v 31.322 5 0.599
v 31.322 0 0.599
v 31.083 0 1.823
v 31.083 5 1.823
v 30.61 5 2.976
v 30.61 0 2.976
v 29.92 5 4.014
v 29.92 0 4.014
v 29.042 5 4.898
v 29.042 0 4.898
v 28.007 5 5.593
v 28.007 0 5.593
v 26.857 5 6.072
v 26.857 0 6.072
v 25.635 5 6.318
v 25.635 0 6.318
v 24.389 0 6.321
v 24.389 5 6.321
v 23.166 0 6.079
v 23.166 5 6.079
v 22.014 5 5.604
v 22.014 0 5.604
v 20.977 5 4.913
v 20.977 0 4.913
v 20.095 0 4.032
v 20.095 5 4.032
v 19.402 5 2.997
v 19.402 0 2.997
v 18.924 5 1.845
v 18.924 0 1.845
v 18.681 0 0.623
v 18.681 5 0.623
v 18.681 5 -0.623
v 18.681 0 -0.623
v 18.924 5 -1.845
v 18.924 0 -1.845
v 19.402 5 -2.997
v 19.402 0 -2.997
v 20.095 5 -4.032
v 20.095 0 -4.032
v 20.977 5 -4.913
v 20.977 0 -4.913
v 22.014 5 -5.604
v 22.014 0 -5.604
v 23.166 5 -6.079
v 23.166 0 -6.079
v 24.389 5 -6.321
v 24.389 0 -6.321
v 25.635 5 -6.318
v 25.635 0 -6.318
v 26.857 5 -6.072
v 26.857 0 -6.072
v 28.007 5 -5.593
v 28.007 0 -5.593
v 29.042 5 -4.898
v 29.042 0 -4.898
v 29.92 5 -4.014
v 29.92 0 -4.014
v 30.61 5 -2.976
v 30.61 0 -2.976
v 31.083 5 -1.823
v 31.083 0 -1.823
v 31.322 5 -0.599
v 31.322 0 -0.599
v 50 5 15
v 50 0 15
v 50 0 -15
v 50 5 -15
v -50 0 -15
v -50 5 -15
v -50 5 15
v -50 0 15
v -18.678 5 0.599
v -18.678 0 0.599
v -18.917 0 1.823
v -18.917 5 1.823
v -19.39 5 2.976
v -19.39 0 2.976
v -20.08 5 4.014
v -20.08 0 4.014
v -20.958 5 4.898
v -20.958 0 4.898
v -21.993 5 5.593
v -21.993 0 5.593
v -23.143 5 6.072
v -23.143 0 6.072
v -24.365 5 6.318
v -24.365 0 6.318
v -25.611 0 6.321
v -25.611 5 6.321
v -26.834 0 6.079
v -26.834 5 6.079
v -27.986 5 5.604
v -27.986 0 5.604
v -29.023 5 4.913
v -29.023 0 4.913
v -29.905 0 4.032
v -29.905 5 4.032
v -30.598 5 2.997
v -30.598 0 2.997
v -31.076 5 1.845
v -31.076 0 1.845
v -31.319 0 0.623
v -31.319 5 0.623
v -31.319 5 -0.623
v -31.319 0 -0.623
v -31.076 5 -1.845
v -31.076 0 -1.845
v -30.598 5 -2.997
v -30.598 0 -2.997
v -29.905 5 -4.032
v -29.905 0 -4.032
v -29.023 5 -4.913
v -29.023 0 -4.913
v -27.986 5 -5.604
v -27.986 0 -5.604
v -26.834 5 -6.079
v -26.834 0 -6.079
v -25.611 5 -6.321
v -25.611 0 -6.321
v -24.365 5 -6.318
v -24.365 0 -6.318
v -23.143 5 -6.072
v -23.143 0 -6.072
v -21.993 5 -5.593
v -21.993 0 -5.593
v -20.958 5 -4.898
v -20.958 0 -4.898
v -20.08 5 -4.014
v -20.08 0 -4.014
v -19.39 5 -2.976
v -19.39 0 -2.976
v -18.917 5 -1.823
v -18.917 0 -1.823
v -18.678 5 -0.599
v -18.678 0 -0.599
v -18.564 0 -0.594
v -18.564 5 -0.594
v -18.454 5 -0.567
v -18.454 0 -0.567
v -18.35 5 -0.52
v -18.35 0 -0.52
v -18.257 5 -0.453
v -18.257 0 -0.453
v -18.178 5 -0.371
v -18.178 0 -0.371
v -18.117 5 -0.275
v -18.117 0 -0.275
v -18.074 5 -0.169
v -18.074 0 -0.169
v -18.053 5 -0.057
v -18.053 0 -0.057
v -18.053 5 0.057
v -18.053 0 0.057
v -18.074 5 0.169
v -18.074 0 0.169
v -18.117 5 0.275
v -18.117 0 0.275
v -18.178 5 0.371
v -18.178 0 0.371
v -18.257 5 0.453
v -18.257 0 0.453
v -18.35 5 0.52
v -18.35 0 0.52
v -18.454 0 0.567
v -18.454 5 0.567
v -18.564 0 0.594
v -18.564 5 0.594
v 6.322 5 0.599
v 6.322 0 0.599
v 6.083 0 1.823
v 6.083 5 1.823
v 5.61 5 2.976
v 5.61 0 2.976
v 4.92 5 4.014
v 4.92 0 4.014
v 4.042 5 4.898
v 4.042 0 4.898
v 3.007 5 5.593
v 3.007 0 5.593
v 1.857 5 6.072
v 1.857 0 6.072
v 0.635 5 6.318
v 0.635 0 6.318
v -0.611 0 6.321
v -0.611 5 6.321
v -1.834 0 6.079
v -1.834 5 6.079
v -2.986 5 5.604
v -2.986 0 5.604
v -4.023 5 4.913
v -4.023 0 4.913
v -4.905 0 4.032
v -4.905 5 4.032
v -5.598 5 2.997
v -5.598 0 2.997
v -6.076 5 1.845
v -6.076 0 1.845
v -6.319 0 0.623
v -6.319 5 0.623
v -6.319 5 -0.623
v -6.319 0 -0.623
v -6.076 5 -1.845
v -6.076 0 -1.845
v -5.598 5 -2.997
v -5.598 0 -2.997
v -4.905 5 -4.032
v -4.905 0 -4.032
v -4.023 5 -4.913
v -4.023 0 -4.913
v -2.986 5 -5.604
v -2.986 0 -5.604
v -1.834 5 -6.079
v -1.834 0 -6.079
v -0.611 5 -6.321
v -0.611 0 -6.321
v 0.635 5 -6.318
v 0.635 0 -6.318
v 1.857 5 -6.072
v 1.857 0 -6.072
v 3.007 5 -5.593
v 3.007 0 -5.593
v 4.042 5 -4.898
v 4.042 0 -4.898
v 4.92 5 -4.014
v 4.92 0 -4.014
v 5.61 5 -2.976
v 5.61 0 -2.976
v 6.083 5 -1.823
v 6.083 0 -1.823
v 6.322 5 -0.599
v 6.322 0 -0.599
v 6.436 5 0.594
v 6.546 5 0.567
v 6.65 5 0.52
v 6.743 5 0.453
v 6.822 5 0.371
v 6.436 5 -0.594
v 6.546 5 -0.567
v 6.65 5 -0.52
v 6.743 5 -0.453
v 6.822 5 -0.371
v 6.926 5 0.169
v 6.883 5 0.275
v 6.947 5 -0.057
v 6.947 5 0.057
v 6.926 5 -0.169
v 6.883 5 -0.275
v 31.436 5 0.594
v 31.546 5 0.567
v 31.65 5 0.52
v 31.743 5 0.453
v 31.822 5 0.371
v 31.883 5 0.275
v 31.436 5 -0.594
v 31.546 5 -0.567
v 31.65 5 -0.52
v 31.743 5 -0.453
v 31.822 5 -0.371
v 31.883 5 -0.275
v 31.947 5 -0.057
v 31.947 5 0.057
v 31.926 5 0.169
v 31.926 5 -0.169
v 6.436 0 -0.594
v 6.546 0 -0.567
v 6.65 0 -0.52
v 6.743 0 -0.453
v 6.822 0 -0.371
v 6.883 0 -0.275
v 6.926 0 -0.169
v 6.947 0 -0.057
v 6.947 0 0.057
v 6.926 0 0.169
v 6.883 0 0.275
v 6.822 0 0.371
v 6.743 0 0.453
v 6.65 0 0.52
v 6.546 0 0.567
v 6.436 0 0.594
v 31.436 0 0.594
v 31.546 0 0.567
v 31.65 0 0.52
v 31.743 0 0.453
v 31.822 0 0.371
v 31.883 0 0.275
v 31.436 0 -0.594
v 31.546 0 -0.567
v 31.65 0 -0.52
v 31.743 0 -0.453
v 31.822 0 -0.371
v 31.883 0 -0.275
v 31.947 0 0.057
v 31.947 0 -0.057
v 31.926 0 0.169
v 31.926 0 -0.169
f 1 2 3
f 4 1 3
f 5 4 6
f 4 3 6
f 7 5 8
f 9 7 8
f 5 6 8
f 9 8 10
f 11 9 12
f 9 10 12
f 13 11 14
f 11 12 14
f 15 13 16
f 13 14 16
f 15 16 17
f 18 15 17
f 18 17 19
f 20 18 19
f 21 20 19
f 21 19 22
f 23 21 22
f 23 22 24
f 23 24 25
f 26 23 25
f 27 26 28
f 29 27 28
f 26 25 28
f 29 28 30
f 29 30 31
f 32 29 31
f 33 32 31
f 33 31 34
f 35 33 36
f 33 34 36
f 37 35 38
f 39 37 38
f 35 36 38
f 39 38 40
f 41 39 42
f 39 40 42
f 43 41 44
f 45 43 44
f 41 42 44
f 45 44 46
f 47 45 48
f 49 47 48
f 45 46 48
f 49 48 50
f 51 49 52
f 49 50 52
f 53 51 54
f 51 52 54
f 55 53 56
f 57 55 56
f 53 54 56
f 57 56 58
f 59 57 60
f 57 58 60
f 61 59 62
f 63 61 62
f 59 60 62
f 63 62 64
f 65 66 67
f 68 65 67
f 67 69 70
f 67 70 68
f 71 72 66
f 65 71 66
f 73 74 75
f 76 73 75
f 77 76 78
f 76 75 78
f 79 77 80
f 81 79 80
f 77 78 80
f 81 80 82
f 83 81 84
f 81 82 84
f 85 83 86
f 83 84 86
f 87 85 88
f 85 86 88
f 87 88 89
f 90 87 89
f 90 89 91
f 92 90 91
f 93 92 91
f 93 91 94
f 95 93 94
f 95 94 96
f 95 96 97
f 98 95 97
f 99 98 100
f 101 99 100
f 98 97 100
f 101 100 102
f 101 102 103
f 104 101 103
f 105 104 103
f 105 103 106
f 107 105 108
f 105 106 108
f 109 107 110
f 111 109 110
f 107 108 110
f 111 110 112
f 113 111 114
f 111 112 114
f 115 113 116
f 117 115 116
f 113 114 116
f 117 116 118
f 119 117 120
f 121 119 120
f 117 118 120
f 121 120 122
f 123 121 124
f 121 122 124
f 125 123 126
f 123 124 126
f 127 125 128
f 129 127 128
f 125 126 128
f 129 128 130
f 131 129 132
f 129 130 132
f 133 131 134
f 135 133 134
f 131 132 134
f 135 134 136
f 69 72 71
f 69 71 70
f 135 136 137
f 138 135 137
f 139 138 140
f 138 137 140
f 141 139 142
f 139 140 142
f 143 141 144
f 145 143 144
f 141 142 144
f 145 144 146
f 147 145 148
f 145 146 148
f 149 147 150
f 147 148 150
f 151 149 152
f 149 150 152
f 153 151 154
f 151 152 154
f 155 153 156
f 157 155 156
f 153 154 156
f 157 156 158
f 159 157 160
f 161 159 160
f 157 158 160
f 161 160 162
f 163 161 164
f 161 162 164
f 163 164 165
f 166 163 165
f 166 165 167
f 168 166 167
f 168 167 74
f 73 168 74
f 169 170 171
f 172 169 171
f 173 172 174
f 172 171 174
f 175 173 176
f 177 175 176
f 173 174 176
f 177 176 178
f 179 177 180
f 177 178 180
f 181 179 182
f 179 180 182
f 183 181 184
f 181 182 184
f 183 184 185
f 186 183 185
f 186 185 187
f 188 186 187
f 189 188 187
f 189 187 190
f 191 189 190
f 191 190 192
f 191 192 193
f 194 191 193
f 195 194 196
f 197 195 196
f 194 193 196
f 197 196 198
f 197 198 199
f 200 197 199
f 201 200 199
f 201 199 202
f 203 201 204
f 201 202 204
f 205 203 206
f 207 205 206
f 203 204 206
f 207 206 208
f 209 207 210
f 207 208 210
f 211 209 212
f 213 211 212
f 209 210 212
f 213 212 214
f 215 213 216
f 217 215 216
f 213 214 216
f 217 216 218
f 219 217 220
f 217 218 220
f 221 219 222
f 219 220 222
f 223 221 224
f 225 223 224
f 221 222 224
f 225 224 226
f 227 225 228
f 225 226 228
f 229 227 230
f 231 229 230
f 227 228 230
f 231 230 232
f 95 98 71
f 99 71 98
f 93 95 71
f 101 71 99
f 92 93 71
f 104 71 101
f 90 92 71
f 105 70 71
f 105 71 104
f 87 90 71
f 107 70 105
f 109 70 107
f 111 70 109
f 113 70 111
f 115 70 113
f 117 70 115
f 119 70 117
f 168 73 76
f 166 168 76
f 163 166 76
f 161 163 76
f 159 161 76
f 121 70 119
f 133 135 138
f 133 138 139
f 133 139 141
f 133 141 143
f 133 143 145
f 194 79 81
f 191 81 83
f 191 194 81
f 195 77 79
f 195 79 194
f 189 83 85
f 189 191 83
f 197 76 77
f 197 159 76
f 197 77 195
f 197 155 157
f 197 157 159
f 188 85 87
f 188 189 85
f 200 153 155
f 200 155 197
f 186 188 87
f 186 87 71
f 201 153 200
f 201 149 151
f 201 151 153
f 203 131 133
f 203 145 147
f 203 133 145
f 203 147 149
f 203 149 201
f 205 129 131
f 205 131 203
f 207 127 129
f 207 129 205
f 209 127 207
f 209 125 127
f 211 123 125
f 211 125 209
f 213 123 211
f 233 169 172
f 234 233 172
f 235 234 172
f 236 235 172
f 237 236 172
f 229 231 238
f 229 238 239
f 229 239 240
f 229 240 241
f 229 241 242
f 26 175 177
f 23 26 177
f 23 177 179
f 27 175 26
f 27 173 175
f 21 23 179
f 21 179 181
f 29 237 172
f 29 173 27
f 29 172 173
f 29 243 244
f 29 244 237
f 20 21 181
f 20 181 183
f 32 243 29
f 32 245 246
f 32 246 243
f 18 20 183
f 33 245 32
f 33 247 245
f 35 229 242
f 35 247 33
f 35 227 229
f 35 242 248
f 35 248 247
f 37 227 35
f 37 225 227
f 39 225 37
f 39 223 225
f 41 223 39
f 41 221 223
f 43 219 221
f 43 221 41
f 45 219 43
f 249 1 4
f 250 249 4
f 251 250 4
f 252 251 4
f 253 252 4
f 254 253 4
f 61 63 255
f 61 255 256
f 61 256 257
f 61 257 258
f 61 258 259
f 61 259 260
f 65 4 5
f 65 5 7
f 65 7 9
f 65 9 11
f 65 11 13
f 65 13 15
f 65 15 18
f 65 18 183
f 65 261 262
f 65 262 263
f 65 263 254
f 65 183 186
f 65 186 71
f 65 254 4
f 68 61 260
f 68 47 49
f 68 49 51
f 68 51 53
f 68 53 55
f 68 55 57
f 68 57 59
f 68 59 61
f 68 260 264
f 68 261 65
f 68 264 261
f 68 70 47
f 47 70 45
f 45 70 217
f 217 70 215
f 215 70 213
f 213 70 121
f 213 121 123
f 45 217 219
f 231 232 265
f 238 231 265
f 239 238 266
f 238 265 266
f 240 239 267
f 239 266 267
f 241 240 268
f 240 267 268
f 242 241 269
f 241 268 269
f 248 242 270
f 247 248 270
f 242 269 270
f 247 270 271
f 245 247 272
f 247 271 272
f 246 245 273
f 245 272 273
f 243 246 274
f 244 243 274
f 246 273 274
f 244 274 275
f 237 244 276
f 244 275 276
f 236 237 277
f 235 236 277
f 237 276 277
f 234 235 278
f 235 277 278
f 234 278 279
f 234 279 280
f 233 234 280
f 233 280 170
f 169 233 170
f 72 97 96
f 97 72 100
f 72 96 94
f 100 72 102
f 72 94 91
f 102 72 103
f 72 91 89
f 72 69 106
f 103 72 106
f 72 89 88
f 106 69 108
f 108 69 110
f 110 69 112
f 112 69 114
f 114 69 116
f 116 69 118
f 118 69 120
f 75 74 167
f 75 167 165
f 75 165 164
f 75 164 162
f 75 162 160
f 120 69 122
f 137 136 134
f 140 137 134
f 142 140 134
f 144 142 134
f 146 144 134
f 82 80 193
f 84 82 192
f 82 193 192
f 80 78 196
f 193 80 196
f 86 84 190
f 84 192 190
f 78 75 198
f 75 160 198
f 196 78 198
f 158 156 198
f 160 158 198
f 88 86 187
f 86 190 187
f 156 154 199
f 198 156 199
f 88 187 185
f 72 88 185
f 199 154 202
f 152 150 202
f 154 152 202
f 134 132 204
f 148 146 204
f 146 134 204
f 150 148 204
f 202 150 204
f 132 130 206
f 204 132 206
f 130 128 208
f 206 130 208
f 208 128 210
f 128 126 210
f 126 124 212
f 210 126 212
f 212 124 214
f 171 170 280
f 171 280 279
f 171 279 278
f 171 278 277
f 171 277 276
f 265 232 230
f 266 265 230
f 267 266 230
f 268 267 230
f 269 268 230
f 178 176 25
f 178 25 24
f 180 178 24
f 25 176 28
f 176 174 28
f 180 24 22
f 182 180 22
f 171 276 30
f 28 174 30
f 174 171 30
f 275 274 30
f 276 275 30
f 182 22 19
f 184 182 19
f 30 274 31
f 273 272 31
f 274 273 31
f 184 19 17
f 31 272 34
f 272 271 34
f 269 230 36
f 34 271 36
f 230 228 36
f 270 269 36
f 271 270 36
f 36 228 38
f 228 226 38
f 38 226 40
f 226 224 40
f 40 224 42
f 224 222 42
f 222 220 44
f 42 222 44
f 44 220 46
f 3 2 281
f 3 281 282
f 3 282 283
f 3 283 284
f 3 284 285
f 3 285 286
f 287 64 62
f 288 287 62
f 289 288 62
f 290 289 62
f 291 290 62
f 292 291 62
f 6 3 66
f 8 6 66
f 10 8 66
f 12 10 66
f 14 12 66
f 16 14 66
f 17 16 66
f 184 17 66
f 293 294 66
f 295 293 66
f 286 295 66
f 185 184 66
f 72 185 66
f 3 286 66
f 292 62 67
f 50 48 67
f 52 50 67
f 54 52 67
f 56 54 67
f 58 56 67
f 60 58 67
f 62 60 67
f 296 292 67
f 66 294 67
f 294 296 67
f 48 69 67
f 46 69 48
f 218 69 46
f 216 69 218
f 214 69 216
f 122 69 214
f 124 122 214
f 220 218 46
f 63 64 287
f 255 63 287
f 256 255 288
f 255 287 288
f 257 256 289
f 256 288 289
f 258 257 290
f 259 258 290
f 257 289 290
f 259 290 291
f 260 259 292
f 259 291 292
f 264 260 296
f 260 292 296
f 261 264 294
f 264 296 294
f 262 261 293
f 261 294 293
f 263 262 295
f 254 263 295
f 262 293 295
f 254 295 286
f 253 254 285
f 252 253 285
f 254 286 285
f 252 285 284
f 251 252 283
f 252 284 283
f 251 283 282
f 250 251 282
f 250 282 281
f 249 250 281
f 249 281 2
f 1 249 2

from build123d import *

# Parameters (mm, degrees)
SKETCH1_W           = 100
SKETCH1_H           = 30
BOSS_EXTRUDE1_DEPTH = 5


with BuildPart() as part:
    # Sketch1 → Boss-Extrude1 (new body)
    with BuildSketch(Plane(origin=(0, 0, 0), x_dir=(1, 0, 0), z_dir=(0, 1, 0))):
        Rectangle(SKETCH1_W, SKETCH1_H)
        with BuildLine():
            ThreePointArc((31.321653543, 0.599330025), (31.95, 0), (31.321653543, -0.599330025))
            ThreePointArc((31.321653543, -0.599330025), (18.65, 0), (31.321653543, 0.599330025))
        make_face(mode=Mode.SUBTRACT)
        with BuildLine():
            ThreePointArc((6.321653543, 0.599330025), (6.95, 0), (6.321653543, -0.599330025))
            ThreePointArc((6.321653543, -0.599330025), (-6.35, 0), (6.321653543, 0.599330025))
        make_face(mode=Mode.SUBTRACT)
        with BuildLine():
            ThreePointArc((-18.678346457, 0.599330025), (-18.05, 0), (-18.678346457, -0.599330025))
            ThreePointArc((-18.678346457, -0.599330025), (-31.35, 0), (-18.678346457, 0.599330025))
        make_face(mode=Mode.SUBTRACT)
    extrude(amount=BOSS_EXTRUDE1_DEPTH)


solid = part.part
